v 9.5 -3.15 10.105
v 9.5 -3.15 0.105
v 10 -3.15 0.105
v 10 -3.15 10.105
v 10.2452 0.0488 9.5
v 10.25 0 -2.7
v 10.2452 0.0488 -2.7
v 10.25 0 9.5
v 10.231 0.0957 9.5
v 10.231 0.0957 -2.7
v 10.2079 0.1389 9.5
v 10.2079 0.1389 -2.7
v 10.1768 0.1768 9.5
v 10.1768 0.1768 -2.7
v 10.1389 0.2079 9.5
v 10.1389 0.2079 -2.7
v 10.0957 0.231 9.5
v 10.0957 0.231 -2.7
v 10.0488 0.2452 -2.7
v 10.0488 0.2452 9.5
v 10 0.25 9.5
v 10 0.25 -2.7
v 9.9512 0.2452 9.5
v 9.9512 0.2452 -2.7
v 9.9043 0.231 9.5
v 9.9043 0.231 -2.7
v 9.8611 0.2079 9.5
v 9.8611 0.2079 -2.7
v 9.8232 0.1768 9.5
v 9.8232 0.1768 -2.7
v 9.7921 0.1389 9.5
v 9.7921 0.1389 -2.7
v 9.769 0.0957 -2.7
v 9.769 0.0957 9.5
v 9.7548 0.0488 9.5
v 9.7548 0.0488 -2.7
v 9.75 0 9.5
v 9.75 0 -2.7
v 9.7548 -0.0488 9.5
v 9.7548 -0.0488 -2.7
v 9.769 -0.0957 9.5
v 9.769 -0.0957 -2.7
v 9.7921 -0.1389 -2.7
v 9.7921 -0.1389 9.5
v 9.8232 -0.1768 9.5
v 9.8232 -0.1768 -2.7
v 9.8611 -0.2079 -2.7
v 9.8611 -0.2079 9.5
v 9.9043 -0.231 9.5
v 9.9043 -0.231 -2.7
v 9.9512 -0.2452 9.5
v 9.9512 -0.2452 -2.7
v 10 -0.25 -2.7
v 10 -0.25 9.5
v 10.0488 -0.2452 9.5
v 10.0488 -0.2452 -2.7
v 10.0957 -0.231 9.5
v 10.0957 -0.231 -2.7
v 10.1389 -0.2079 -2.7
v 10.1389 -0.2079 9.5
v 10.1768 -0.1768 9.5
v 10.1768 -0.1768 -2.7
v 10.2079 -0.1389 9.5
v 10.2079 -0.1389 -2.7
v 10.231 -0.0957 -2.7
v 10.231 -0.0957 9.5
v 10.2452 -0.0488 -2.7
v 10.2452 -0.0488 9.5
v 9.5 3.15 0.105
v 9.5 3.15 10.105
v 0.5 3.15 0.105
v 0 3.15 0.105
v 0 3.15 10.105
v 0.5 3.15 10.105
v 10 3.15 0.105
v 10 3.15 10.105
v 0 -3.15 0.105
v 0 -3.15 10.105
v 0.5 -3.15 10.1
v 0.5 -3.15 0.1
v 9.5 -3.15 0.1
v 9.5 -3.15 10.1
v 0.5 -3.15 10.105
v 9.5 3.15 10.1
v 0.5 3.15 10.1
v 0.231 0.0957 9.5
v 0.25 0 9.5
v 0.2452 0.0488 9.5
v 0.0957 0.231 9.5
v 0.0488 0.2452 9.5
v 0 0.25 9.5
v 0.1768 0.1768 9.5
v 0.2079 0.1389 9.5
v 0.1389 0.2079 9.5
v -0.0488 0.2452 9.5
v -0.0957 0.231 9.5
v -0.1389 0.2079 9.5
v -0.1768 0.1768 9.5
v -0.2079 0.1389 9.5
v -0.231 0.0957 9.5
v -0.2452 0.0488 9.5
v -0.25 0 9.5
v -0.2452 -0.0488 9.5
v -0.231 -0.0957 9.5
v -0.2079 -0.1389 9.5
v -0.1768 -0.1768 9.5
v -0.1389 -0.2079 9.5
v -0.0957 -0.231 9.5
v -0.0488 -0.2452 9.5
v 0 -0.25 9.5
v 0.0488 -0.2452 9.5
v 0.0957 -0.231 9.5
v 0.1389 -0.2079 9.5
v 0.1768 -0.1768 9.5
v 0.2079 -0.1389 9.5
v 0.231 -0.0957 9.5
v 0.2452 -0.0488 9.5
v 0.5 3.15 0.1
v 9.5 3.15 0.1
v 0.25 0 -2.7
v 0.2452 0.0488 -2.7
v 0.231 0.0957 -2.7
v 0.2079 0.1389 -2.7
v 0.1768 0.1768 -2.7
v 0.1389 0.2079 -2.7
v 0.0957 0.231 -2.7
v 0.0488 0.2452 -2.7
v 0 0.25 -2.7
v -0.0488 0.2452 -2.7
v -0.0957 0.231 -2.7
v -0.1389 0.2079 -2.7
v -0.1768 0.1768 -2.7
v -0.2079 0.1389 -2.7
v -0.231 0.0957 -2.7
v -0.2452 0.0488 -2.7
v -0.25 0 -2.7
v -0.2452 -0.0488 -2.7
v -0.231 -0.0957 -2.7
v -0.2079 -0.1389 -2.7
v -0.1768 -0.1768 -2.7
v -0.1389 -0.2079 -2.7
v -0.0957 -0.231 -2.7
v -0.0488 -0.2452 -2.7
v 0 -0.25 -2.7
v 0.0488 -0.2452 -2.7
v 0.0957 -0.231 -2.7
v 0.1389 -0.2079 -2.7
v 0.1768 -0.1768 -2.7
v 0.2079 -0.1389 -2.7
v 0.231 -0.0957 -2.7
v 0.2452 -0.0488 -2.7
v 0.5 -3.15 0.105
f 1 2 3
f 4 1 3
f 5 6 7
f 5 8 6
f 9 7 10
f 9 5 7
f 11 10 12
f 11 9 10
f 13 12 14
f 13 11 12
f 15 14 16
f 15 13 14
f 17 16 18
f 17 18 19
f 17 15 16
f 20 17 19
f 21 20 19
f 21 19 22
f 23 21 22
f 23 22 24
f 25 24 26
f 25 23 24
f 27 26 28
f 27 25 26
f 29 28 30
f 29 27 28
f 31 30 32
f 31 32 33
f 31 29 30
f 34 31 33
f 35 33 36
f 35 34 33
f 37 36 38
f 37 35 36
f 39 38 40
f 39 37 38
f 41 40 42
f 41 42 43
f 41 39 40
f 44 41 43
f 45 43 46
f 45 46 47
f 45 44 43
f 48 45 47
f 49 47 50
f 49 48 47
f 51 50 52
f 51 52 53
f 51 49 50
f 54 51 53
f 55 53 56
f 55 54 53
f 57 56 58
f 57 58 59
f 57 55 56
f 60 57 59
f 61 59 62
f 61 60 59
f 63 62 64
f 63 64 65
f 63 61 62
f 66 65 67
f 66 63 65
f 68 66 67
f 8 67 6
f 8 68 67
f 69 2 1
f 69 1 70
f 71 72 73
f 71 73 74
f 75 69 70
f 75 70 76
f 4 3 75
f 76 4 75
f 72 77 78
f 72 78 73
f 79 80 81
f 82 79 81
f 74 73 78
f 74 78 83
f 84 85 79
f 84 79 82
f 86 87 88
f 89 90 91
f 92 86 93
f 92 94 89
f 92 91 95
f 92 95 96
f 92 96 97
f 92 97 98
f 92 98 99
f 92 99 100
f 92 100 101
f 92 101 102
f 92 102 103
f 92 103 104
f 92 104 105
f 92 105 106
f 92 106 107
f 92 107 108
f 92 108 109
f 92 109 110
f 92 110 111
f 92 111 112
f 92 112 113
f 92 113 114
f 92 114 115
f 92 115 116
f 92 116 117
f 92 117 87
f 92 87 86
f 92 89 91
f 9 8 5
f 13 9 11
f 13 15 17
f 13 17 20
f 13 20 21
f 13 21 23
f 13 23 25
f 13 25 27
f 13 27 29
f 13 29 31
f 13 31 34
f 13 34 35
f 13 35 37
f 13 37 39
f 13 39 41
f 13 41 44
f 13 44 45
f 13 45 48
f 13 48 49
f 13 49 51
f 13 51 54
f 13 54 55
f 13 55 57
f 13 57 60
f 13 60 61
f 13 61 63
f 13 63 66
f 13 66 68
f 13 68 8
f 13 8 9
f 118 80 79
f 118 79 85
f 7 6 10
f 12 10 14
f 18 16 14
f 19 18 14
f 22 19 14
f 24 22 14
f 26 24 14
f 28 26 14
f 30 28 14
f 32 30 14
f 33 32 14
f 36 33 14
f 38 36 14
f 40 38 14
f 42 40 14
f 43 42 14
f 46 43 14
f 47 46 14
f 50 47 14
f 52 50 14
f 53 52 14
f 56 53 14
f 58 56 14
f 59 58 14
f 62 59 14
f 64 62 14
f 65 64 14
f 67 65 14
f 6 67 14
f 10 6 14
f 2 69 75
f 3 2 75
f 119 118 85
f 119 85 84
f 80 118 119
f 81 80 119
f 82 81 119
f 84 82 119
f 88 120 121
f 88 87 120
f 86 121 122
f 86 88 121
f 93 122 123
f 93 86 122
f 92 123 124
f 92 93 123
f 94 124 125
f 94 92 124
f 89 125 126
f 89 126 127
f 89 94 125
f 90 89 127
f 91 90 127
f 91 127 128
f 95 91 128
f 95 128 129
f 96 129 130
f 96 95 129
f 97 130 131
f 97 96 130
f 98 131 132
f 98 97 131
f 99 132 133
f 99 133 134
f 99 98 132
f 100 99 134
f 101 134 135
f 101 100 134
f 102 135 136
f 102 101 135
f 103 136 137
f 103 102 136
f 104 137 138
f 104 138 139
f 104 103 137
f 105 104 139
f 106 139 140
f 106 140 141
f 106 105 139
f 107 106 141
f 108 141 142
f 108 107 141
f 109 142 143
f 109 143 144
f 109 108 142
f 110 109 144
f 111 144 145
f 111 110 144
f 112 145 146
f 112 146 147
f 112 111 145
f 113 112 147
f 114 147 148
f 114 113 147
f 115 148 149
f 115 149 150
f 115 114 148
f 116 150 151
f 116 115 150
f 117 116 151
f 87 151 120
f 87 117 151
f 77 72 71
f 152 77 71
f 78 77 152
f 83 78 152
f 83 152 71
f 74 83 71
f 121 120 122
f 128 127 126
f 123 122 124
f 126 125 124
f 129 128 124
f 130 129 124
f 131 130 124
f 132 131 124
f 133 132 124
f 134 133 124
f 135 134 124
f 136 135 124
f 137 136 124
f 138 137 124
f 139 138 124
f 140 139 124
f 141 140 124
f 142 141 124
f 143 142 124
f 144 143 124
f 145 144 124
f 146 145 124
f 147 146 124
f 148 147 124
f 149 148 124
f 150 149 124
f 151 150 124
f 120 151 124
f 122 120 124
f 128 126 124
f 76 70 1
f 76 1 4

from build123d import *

# Parameters (mm, degrees)
SKETCH_W          = 9
SKETCH_H          = 6.3
PAD_DEPTH         = 10
SKETCH001_R       = 0.25
PAD001_DEPTH      = 9
PAD001_DEPTH_BACK = 3.2
SKETCH002_W       = 0.5
SKETCH002_H       = 6.3
PAD002_DEPTH      = 10


with BuildPart() as pad:
    # Sketch → Pad (new body)
    with BuildSketch(Plane.XY.offset(0.1)):
        with Locations((5, 0)):
            Rectangle(SKETCH_W, SKETCH_H)
    extrude(amount=PAD_DEPTH)


with BuildPart() as pad001:
    # Sketch001 → Pad001 (new body, two sides)
    with BuildSketch(Plane.XY.offset(0.5)) as pad001_sk:
        Circle(SKETCH001_R)
        with Locations((10, 0)):
            Circle(SKETCH001_R)
    extrude(amount=PAD001_DEPTH)
    extrude(pad001_sk.sketch, amount=-PAD001_DEPTH_BACK)


with BuildPart() as pad002:
    # Sketch002 → Pad002 (new body)
    with BuildSketch(Plane.XY.offset(0.105)):
        with Locations((0.25, 0)):
            Rectangle(SKETCH002_W, SKETCH002_H)
        with Locations((9.75, 0)):
            Rectangle(SKETCH002_W, SKETCH002_H)
    extrude(amount=PAD002_DEPTH)


solid = Compound([pad.part, pad001.part, pad002.part])
